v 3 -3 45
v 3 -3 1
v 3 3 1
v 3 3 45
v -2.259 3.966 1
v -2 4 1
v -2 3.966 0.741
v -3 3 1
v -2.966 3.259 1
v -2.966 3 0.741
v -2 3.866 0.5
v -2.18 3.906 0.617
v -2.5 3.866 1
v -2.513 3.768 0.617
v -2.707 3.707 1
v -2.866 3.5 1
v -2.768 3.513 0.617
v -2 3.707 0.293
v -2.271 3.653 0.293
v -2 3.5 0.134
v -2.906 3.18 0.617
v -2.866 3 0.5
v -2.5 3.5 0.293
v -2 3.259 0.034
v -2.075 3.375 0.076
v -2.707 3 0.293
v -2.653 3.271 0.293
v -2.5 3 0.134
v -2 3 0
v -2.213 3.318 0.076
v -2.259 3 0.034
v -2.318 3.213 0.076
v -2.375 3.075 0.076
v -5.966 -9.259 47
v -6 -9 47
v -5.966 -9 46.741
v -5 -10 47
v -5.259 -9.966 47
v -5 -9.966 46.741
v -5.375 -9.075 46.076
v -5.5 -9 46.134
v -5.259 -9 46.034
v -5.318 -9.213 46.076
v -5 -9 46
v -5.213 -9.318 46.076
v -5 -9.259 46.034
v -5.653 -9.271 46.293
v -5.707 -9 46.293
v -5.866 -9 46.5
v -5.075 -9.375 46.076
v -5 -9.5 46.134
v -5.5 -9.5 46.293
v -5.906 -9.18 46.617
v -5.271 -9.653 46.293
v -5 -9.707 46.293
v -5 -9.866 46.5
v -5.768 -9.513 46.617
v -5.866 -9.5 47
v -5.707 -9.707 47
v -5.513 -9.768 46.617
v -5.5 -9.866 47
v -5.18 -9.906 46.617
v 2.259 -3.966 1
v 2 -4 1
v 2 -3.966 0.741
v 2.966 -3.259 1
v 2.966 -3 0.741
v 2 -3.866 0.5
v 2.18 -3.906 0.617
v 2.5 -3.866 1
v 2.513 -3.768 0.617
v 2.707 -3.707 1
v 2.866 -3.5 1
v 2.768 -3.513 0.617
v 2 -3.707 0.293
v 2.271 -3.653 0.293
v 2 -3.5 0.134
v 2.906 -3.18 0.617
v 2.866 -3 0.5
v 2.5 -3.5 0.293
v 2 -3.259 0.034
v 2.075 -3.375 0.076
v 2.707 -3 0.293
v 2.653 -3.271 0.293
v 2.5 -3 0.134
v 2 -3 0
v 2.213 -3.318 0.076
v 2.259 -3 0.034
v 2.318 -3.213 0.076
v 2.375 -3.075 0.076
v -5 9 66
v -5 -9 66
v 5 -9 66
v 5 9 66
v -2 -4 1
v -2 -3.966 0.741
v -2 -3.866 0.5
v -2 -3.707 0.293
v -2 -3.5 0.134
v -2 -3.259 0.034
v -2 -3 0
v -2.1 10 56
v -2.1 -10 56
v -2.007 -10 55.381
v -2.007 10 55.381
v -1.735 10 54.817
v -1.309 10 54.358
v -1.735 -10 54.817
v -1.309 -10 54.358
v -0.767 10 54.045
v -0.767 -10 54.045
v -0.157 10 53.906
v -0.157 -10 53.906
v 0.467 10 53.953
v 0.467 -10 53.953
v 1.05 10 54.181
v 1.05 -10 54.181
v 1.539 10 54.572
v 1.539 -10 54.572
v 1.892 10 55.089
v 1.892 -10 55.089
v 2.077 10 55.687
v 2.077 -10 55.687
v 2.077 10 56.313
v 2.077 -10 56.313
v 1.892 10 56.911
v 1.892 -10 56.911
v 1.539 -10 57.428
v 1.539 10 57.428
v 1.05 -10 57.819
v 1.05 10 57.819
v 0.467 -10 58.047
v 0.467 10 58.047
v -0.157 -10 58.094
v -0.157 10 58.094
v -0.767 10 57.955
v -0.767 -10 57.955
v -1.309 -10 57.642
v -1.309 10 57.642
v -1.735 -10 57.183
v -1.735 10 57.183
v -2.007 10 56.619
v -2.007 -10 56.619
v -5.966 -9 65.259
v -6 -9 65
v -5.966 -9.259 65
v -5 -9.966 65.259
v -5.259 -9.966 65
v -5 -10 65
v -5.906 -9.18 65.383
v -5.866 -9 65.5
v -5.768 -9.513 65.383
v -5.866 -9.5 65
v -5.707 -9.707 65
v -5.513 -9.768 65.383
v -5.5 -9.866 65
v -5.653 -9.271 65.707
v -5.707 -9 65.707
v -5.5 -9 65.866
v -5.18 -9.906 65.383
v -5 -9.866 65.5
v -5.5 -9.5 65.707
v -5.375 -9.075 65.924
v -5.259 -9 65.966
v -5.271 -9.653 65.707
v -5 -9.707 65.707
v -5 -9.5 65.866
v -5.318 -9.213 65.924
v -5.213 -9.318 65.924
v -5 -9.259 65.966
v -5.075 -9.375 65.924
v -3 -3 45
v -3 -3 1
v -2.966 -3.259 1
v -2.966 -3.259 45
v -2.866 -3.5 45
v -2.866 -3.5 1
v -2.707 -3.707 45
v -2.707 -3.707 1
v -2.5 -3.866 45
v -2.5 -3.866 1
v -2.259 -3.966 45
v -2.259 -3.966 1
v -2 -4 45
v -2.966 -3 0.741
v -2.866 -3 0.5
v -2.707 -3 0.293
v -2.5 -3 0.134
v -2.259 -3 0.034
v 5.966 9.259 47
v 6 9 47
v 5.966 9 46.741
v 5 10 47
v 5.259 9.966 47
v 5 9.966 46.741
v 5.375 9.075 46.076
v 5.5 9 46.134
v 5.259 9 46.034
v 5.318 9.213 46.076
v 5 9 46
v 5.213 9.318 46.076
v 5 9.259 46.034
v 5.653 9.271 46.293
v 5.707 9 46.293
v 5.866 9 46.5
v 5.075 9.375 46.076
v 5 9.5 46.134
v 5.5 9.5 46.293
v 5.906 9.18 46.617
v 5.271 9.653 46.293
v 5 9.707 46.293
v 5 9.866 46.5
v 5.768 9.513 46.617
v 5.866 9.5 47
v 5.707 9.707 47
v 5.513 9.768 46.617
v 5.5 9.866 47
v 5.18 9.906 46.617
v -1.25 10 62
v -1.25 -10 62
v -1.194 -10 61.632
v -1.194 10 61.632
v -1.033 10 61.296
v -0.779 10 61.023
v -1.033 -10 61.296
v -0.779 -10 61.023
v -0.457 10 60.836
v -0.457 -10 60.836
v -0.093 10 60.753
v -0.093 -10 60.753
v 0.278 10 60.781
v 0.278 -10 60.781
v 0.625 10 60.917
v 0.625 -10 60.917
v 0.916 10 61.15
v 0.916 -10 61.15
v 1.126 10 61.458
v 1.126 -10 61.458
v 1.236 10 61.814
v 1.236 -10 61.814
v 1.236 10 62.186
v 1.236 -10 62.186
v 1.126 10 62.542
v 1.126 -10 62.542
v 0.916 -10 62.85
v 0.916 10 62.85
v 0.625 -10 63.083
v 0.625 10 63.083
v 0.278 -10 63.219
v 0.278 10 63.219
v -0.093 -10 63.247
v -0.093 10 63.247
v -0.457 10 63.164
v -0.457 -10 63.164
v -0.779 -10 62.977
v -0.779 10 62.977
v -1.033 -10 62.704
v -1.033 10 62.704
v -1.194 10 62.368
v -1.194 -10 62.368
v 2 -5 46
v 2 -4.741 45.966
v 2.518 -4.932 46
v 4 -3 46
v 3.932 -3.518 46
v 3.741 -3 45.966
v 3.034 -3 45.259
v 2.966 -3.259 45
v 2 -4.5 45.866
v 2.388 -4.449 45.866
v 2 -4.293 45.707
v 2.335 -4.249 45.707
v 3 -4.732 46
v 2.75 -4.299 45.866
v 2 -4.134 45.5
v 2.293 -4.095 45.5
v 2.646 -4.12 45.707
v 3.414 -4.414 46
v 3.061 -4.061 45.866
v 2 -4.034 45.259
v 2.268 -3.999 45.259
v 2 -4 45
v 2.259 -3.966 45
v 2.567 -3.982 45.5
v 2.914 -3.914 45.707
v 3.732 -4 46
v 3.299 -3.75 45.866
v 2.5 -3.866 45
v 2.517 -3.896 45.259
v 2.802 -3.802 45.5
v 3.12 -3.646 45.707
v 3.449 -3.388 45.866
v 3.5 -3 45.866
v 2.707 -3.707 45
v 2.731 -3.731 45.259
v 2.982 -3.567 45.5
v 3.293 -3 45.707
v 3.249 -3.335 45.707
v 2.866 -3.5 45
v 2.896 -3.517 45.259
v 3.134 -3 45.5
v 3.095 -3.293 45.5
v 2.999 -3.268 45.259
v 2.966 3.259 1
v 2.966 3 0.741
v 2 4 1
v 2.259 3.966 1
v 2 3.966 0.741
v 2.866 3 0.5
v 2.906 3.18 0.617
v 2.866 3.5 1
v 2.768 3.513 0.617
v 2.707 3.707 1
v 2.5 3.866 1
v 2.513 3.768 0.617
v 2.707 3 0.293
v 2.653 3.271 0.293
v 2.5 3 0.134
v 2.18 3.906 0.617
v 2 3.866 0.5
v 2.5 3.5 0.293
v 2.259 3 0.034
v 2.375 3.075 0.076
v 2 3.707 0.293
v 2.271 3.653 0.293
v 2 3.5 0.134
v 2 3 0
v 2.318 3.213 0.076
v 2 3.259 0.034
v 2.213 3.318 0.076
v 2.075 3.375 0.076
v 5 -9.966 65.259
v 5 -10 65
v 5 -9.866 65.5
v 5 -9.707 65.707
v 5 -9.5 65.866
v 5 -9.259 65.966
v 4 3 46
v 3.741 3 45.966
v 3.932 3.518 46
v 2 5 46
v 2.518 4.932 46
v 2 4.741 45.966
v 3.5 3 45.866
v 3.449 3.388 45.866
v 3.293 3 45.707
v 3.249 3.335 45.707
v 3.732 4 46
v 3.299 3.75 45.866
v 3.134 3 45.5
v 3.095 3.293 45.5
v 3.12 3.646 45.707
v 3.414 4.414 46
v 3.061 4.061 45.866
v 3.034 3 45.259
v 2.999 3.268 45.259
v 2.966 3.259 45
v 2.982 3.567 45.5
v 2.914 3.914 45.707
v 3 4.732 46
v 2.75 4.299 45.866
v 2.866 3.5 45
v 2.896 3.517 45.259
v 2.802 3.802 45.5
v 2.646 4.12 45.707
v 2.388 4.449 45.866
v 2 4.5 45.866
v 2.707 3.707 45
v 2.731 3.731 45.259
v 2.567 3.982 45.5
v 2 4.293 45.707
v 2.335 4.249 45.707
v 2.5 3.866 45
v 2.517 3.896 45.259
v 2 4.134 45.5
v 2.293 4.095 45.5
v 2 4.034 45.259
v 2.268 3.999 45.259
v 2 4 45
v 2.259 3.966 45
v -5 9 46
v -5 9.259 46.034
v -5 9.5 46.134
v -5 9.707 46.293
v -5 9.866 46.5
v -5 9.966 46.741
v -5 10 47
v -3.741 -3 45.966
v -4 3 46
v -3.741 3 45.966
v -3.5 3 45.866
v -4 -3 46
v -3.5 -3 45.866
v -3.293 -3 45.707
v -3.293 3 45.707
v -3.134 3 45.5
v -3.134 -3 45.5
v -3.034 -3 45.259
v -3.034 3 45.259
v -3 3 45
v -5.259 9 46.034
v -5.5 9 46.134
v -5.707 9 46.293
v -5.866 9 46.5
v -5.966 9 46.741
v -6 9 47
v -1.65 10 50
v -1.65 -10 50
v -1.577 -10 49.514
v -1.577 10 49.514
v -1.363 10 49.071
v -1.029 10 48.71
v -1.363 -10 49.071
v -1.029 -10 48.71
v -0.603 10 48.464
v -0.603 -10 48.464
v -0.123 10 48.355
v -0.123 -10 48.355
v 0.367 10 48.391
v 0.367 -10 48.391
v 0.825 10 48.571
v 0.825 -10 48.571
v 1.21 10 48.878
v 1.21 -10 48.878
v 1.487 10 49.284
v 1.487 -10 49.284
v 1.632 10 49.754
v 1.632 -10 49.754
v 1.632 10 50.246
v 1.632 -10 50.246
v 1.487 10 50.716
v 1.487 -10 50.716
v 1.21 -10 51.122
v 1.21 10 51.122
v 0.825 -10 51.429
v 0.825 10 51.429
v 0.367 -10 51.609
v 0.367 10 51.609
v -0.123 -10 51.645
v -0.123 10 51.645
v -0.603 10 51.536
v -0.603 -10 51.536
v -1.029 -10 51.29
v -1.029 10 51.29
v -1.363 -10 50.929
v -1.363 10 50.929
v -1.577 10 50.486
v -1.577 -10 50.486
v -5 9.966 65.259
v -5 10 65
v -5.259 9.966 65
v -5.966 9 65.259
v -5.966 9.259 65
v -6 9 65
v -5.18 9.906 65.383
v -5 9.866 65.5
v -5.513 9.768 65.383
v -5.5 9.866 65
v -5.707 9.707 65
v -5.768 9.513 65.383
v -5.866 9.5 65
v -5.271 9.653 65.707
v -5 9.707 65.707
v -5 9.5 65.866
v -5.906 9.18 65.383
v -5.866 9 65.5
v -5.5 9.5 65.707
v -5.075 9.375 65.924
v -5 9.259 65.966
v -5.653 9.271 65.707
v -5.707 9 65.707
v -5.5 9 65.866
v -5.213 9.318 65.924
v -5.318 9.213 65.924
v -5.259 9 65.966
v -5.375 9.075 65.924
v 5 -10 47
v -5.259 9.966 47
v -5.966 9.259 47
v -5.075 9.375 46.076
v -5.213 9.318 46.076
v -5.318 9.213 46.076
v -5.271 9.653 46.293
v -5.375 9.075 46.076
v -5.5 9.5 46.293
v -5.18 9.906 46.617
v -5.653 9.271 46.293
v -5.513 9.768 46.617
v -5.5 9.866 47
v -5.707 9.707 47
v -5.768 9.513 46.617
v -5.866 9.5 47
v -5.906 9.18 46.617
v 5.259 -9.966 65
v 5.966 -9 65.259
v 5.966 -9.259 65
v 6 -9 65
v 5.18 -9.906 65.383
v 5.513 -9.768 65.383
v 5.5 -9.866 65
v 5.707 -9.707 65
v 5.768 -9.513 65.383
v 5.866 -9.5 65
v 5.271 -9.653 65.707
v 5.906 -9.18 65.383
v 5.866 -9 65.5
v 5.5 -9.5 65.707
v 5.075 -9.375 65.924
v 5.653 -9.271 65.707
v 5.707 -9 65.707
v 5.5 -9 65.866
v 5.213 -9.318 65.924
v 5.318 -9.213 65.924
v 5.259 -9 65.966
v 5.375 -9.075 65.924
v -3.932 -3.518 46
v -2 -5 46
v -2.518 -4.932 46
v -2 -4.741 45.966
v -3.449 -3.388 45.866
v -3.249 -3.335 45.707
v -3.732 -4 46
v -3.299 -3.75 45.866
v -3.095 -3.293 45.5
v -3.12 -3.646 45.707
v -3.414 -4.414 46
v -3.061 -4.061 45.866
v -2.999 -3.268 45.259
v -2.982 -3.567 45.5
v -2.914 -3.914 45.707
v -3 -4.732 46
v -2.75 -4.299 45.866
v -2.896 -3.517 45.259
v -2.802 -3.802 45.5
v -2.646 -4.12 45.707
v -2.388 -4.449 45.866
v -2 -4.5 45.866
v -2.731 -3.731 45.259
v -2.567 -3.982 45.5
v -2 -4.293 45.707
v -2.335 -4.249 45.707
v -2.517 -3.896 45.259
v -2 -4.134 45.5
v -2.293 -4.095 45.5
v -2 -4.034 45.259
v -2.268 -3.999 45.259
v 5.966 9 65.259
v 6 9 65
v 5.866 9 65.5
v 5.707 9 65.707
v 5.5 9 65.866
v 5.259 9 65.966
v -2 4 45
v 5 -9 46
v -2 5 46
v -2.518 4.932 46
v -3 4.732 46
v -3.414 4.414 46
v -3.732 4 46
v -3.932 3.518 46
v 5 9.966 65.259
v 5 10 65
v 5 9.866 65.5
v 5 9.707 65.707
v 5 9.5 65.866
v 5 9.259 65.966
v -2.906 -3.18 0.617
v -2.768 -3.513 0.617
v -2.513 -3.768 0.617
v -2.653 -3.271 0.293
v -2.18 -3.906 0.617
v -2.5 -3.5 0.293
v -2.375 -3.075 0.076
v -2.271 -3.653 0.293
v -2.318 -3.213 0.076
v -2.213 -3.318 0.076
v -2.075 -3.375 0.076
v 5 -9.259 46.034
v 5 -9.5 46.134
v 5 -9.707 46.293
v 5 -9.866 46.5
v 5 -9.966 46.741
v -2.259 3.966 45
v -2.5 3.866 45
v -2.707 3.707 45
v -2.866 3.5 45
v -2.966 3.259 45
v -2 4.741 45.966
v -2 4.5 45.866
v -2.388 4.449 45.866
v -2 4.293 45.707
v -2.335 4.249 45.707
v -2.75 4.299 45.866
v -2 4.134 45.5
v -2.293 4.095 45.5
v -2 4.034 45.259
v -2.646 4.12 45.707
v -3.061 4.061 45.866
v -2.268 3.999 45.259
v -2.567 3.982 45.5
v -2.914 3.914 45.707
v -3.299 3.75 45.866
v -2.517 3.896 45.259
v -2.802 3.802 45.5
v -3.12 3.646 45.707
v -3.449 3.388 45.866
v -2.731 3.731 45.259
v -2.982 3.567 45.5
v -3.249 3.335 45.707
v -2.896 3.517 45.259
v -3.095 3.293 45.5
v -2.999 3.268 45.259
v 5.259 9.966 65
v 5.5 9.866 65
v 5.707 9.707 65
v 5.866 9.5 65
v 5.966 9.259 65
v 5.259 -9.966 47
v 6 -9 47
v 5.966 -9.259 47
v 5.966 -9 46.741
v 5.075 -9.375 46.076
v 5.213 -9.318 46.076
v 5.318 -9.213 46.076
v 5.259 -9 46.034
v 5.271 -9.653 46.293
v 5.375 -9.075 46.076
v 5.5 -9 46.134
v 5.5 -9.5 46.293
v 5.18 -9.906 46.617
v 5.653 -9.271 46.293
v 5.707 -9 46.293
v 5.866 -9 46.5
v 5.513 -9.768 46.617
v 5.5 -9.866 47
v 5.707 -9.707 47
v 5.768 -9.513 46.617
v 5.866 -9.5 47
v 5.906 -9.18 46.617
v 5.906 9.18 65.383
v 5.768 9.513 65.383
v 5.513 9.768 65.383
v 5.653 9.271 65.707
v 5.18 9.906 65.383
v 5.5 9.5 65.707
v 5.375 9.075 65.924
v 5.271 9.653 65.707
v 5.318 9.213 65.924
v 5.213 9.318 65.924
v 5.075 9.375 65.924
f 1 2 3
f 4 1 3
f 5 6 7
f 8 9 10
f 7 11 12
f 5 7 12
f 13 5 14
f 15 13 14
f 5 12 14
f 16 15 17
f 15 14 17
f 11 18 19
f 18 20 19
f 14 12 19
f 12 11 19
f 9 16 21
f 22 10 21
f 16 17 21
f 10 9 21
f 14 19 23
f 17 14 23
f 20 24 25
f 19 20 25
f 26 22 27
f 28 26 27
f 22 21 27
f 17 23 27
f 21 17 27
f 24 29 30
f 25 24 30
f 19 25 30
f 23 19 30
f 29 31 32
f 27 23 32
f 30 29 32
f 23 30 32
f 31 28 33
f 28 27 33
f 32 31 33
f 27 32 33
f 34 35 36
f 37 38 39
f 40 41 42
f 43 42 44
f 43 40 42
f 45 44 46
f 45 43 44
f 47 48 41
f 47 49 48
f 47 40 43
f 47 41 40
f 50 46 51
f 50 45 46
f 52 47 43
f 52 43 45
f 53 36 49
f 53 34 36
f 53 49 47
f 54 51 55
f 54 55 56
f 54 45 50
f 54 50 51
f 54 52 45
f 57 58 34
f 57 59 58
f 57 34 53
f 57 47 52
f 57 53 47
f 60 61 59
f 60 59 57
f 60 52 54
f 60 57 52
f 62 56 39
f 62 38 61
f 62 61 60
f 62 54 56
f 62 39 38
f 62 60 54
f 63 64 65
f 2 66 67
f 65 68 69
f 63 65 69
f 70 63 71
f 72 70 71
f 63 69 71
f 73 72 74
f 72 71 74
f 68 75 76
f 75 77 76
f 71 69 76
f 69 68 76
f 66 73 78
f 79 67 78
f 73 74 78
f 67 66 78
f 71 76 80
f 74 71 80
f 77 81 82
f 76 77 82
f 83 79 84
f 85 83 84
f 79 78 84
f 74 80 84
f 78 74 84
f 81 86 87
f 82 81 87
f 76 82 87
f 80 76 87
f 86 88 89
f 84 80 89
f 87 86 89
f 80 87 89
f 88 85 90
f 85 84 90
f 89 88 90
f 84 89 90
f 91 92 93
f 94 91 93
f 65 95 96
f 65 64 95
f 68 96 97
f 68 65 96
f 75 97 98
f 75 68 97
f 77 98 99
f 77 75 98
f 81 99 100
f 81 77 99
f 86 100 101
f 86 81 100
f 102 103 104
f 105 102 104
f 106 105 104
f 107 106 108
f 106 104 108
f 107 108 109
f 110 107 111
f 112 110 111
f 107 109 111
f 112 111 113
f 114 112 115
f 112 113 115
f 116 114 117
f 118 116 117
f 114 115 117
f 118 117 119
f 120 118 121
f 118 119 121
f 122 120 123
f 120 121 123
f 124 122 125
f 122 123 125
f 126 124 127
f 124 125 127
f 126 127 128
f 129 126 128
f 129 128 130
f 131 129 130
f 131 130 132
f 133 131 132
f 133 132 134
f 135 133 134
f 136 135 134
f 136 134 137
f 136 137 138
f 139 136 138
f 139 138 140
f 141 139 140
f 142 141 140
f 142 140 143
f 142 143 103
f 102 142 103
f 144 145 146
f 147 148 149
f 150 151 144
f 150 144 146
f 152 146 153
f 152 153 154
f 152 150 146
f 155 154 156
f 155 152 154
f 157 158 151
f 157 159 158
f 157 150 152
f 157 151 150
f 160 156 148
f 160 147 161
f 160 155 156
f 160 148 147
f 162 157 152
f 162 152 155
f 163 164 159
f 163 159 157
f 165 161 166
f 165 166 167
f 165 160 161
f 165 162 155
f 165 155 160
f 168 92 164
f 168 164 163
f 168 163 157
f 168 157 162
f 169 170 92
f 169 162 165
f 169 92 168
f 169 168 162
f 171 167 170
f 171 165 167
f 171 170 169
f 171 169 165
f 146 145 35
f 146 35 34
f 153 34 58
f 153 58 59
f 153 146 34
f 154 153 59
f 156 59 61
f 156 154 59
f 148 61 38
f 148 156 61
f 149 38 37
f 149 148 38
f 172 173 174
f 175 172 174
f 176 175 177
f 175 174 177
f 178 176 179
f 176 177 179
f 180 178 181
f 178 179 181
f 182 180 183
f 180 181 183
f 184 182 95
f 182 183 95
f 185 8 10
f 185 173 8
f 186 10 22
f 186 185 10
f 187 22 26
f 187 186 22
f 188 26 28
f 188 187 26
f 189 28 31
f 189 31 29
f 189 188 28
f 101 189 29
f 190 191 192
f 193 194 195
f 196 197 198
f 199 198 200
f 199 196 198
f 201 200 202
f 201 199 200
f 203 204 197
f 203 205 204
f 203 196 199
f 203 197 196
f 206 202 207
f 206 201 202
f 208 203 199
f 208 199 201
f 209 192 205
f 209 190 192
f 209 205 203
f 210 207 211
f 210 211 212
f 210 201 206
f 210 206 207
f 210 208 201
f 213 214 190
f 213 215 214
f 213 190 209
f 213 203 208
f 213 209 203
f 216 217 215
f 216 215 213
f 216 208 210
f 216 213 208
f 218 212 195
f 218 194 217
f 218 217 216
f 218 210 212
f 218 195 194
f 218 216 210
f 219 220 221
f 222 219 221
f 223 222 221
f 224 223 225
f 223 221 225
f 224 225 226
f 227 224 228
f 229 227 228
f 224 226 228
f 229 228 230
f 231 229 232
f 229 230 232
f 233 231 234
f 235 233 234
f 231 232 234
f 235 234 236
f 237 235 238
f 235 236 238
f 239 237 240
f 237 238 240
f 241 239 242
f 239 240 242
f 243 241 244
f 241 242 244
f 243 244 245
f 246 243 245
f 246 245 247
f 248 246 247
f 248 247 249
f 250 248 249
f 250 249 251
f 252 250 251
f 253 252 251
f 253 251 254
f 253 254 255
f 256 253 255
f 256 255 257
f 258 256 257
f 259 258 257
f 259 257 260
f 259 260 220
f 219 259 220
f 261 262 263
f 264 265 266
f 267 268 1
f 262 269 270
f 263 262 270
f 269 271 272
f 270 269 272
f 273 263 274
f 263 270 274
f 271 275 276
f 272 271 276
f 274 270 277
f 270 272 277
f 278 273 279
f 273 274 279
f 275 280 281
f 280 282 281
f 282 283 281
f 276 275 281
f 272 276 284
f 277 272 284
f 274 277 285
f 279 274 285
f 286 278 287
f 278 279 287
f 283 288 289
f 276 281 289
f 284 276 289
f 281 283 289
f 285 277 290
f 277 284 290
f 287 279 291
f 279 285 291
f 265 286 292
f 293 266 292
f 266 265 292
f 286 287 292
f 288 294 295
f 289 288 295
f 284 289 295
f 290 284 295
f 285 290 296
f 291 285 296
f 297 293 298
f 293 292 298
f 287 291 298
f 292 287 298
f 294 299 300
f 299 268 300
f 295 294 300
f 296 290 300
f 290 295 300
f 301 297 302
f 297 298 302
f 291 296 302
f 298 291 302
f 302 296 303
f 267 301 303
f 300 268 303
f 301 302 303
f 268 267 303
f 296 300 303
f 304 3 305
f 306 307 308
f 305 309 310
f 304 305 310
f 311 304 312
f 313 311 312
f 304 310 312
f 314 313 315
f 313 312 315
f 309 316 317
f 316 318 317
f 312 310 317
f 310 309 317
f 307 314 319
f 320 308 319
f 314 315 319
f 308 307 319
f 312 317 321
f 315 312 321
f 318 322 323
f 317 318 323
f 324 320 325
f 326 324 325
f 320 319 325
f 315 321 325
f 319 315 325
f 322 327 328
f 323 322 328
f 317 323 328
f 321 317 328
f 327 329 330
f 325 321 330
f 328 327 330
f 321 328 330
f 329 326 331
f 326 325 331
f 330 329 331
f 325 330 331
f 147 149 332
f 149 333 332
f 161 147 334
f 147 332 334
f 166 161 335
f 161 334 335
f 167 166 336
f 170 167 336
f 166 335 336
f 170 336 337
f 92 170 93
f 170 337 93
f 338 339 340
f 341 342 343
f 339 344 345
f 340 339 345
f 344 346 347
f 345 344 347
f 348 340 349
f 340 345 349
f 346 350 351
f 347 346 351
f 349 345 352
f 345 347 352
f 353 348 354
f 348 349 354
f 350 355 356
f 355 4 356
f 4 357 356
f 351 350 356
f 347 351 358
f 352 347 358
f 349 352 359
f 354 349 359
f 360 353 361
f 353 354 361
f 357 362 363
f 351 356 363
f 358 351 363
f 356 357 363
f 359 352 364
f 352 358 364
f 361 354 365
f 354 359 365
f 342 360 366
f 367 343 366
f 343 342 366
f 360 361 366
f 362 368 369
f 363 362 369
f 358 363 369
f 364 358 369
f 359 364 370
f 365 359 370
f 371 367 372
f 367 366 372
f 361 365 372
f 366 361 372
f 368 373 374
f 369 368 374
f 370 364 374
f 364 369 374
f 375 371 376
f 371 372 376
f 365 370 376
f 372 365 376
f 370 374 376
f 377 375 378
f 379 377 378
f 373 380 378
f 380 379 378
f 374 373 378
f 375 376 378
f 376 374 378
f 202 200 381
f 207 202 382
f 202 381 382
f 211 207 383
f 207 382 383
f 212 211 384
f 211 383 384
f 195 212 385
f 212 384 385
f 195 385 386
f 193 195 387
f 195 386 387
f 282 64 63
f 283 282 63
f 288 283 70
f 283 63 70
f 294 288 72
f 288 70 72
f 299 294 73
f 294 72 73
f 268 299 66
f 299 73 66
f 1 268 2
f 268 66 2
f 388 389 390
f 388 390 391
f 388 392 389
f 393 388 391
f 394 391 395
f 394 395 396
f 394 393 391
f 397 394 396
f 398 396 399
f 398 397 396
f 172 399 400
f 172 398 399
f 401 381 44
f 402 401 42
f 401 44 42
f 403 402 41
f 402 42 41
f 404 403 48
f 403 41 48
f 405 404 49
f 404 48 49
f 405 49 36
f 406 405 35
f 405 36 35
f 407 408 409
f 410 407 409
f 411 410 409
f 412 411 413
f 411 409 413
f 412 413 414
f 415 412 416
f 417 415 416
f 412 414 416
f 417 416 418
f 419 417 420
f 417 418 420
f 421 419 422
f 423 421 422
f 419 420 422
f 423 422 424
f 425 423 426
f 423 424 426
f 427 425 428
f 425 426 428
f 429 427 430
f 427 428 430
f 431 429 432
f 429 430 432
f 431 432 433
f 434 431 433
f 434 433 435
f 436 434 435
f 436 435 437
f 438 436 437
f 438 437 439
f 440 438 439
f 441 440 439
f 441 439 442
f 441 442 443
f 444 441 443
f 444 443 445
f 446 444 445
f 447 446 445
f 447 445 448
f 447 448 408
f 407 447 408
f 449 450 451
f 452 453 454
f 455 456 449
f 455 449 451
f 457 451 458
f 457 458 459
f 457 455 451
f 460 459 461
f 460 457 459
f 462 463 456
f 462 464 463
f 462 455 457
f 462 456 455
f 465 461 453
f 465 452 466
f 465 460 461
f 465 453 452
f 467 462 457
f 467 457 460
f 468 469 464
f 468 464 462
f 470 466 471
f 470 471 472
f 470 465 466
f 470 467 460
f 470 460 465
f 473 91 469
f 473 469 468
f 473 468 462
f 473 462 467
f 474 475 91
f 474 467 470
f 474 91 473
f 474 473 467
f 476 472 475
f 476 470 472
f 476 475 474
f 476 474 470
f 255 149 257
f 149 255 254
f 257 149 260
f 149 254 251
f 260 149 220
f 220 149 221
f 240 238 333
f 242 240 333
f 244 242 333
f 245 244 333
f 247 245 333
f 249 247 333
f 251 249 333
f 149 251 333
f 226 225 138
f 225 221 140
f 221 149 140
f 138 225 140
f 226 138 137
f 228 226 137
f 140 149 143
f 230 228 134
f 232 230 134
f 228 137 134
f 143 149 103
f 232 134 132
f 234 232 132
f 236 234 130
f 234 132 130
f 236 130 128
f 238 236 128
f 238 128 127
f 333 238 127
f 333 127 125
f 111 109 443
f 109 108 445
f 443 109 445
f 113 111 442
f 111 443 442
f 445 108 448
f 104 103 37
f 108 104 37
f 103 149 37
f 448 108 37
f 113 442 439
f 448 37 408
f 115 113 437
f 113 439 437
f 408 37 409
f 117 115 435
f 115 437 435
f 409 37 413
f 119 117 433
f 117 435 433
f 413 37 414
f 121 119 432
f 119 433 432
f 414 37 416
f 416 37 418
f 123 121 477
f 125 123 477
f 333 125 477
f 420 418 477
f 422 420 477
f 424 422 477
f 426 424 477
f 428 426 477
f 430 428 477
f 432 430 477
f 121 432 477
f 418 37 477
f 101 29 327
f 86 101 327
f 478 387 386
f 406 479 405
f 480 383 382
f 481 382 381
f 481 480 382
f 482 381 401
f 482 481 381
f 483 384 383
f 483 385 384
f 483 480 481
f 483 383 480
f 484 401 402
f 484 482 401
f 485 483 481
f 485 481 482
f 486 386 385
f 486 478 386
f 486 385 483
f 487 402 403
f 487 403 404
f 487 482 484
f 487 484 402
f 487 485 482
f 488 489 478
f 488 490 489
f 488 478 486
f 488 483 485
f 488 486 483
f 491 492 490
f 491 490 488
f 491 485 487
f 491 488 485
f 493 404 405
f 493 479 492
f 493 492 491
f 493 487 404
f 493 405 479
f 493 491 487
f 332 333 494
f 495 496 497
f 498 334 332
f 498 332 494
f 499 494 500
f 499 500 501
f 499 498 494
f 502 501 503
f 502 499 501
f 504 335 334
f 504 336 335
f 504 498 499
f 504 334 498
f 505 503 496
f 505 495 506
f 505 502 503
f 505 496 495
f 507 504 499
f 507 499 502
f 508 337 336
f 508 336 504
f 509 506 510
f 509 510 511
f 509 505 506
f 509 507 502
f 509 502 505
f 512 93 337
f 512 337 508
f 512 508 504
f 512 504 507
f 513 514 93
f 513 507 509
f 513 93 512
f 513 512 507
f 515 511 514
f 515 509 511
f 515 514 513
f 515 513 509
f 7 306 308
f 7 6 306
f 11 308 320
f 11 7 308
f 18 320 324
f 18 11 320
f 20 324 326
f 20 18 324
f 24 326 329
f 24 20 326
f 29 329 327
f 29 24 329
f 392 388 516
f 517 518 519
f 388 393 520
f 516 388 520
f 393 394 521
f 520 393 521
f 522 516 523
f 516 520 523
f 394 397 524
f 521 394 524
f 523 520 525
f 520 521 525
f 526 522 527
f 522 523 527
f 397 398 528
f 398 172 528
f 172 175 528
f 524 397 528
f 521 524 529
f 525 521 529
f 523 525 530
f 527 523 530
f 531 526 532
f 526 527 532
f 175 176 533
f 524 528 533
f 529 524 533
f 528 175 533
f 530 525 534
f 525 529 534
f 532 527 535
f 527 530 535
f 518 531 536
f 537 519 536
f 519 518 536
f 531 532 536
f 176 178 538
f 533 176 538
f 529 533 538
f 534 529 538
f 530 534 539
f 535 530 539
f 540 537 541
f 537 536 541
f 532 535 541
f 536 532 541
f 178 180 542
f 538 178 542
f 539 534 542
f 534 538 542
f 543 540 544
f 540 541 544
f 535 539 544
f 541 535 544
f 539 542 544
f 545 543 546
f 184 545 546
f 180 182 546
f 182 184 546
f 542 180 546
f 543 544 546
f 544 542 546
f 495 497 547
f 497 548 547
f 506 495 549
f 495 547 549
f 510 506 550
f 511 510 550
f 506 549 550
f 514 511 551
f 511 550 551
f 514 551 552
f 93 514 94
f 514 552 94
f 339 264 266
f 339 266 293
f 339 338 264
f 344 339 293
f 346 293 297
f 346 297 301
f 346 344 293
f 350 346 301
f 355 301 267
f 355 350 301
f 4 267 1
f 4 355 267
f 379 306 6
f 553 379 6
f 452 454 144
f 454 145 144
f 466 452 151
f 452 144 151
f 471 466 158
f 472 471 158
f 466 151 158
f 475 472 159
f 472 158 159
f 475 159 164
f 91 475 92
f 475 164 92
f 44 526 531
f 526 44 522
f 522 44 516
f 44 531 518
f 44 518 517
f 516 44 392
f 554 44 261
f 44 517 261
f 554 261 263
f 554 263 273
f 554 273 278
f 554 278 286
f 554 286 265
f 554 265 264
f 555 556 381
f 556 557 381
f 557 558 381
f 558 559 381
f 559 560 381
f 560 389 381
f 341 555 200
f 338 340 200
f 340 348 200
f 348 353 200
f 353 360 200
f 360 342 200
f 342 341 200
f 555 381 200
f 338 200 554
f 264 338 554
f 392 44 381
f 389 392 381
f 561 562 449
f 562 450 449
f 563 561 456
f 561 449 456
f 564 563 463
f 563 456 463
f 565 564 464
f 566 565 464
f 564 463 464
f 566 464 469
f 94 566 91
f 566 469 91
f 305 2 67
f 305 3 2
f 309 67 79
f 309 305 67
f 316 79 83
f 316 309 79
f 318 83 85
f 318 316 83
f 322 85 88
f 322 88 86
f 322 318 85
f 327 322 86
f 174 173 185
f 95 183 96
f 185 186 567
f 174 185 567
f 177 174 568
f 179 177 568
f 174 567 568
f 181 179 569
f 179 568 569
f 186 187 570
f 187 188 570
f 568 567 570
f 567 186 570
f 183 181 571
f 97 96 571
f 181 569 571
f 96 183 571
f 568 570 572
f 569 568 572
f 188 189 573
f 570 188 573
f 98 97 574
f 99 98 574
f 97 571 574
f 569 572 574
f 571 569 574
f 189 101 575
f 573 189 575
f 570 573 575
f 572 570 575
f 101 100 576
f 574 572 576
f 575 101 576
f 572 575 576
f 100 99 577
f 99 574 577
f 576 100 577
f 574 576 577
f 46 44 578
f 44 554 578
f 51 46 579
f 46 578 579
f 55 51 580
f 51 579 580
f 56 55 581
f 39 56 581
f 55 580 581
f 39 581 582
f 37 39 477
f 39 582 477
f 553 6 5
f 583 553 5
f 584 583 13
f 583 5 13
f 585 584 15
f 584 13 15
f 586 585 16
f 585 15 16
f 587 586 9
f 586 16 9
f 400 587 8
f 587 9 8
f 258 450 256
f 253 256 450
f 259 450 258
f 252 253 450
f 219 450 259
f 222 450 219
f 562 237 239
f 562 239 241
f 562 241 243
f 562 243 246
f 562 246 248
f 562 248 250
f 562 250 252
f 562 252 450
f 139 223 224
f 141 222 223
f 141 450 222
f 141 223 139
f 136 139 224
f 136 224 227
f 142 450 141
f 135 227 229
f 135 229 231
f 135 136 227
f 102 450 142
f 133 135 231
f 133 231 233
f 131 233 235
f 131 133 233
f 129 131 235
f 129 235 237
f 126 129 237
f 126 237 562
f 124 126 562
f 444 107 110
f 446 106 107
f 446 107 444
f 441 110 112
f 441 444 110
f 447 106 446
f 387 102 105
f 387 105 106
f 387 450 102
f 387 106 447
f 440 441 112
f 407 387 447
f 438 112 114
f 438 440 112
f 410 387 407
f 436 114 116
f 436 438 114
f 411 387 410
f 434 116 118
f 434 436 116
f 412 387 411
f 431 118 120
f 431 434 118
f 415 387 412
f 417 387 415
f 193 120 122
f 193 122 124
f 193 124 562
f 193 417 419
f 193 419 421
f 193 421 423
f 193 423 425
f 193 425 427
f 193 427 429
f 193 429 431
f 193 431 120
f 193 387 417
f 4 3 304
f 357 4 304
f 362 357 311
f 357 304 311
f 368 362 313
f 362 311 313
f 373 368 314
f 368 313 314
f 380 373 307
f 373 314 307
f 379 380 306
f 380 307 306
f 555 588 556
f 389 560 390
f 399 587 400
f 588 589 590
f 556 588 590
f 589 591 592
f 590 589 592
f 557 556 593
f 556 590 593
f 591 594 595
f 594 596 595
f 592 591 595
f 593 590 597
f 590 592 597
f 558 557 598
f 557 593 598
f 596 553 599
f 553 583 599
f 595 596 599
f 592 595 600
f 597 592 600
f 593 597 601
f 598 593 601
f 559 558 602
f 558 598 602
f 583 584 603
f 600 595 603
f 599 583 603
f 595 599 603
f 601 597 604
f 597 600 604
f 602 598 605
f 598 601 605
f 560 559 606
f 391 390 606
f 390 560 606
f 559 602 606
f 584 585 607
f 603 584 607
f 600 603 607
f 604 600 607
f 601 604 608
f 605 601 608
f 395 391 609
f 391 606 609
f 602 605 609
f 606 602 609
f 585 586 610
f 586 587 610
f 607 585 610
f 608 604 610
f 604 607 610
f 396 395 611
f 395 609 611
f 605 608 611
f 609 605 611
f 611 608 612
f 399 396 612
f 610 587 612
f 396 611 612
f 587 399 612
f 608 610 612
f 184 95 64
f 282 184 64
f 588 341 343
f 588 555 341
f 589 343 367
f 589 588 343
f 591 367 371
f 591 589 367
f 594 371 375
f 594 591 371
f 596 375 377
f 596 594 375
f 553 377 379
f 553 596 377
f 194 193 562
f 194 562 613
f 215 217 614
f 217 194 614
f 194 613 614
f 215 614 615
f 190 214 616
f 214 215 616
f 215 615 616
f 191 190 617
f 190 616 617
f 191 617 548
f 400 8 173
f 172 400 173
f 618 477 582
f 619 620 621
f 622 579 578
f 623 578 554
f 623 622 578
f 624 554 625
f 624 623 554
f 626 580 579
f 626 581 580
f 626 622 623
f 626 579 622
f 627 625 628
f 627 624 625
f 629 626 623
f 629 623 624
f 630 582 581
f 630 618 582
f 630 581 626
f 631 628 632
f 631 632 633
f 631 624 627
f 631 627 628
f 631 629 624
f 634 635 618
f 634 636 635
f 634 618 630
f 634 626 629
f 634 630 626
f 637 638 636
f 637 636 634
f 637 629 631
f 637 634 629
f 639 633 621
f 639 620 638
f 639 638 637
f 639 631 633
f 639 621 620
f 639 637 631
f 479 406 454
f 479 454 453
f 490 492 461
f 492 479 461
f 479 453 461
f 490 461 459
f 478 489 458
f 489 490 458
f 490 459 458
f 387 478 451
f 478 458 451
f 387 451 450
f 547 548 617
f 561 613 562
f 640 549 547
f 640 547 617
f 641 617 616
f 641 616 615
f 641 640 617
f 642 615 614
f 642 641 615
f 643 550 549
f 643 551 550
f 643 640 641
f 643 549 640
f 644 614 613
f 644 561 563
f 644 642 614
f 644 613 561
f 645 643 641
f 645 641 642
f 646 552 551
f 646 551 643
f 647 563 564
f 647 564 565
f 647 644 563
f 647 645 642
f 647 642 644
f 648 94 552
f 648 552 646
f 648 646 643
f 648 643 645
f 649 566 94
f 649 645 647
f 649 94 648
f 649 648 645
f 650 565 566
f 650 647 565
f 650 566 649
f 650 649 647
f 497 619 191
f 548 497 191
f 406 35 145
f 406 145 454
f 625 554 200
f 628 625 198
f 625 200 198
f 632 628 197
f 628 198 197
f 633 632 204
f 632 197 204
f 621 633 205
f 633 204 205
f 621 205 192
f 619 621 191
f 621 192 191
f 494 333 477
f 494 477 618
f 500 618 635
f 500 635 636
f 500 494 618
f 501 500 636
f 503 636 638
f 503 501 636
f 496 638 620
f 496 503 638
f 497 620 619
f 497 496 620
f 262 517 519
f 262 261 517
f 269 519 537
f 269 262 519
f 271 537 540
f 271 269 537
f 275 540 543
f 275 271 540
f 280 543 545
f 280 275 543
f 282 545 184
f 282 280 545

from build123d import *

# Parameters (mm, degrees)
EXTRUDE_1_DEPTH     = 46
EXTRUDE_2_OUTLINE_W = 12
EXTRUDE_2_OUTLINE_H = 20
EXTRUDE_2_DEPTH     = 20
FILLET_1_R          = 1
FILLET_2_R          = 1
FILLET_3_R          = 1
FILLET_4_R          = 1
FILLET_5_R          = 1
HOLE_WIZARD_M5_1_D  = 4.2
HOLE_WIZARD_M4_1_D  = 3.3
HOLE_WIZARD_M3_1_D  = 2.5


# Read off the part's stored shape, not the designer's step: 凸台-拉伸2
with BuildPart() as part:
    # 草图1 → 凸台-拉伸1 (new body)
    with BuildSketch(Plane.XY):
        with BuildLine():
            Line((-2, -4), (2, -4))
            ThreePointArc((2, -4), (2.707106781, -3.707106781), (3, -3))
            Line((3, -3), (3, 3))
            ThreePointArc((3, 3), (2.707106781, 3.707106781), (2, 4))
            Line((2, 4), (-2, 4))
            ThreePointArc((-2, 4), (-2.707106781, 3.707106781), (-3, 3))
            Line((-3, 3), (-3, -3))
            ThreePointArc((-3, -3), (-2.707106781, -3.707106781), (-2, -4))
        make_face()
    extrude(amount=EXTRUDE_1_DEPTH)

    # 凸台-拉伸2 outline → 凸台-拉伸2 (add)
    with BuildSketch(Plane.XY.offset(46)):
        Rectangle(EXTRUDE_2_OUTLINE_W, EXTRUDE_2_OUTLINE_H)
    extrude(amount=EXTRUDE_2_DEPTH)

    # 圆角1
    fillet_1_edges = [part.edges().sort_by_distance(p)[0] for p in [
        (6, -10, 56),
        (6, 10, 56),
        (-6, 10, 56),
        (-6, -10, 56),
    ]]
    fillet(fillet_1_edges, radius=FILLET_1_R)

    # 圆角2
    fillet_2_edges = [part.edges().sort_by_distance(p)[0] for p in [
        (2.707106781, -3.707106781, 46),
        (3, 0, 46),
        (2.707106781, 3.707106781, 46),
        (0, 4, 46),
        (-2.707106781, 3.707106781, 46),
        (-3, 0, 46),
        (-2.707106781, -3.707106781, 46),
        (0, -4, 46),
    ]]
    fillet(fillet_2_edges, radius=FILLET_2_R)

    # 圆角3
    fillet_3_edges = [part.edges().sort_by_distance(p)[0] for p in [
        (0, -10, 66),
        (-6, 0, 66),
        (6, 0, 66),
        (0, 10, 66),
        (-5.707106781, 9.707106781, 66),
        (5.707106781, 9.707106781, 66),
        (5.707106781, -9.707106781, 66),
        (-5.707106781, -9.707106781, 66),
    ]]
    fillet(fillet_3_edges, radius=FILLET_3_R)

    # 圆角4
    fillet_4_edges = [part.edges().sort_by_distance(p)[0] for p in [
        (0, -10, 46),
        (6, 0, 46),
        (-6, 0, 46),
        (0, 10, 46),
        (-5.707106781, 9.707106781, 46),
        (5.707106781, 9.707106781, 46),
        (5.707106781, -9.707106781, 46),
        (-5.707106781, -9.707106781, 46),
    ]]
    fillet(fillet_4_edges, radius=FILLET_4_R)

    # 圆角5
    fillet_5_edges = [part.edges().sort_by_distance(p)[0] for p in [
        (3, 0, 0),
        (2.707106781, -3.707106781, 0),
        (0, -4, 0),
        (-2.707106781, -3.707106781, 0),
        (-3, 0, 0),
        (-2.707106781, 3.707106781, 0),
        (0, 4, 0),
        (2.707106781, 3.707106781, 0),
    ]]
    fillet(fillet_5_edges, radius=FILLET_5_R)

    # M5 螺纹孔1 (through all)
    with Locations(Plane(origin=(0, 10, 0), x_dir=(1, 0, 0), z_dir=(0, 1, 0))):
        with Locations((0, -56)):
            Hole(HOLE_WIZARD_M5_1_D / 2)

    # M4 螺纹孔1 (through all)
    with Locations(Plane(origin=(0, 10, 0), x_dir=(1, 0, 0), z_dir=(0, 1, 0))):
        with Locations((0, -50)):
            Hole(HOLE_WIZARD_M4_1_D / 2)

    # M3 螺纹孔1 (through all)
    with Locations(Plane(origin=(0, 10, 0), x_dir=(1, 0, 0), z_dir=(0, 1, 0))):
        with Locations((0, -62)):
            Hole(HOLE_WIZARD_M3_1_D / 2)


solid = part.part
